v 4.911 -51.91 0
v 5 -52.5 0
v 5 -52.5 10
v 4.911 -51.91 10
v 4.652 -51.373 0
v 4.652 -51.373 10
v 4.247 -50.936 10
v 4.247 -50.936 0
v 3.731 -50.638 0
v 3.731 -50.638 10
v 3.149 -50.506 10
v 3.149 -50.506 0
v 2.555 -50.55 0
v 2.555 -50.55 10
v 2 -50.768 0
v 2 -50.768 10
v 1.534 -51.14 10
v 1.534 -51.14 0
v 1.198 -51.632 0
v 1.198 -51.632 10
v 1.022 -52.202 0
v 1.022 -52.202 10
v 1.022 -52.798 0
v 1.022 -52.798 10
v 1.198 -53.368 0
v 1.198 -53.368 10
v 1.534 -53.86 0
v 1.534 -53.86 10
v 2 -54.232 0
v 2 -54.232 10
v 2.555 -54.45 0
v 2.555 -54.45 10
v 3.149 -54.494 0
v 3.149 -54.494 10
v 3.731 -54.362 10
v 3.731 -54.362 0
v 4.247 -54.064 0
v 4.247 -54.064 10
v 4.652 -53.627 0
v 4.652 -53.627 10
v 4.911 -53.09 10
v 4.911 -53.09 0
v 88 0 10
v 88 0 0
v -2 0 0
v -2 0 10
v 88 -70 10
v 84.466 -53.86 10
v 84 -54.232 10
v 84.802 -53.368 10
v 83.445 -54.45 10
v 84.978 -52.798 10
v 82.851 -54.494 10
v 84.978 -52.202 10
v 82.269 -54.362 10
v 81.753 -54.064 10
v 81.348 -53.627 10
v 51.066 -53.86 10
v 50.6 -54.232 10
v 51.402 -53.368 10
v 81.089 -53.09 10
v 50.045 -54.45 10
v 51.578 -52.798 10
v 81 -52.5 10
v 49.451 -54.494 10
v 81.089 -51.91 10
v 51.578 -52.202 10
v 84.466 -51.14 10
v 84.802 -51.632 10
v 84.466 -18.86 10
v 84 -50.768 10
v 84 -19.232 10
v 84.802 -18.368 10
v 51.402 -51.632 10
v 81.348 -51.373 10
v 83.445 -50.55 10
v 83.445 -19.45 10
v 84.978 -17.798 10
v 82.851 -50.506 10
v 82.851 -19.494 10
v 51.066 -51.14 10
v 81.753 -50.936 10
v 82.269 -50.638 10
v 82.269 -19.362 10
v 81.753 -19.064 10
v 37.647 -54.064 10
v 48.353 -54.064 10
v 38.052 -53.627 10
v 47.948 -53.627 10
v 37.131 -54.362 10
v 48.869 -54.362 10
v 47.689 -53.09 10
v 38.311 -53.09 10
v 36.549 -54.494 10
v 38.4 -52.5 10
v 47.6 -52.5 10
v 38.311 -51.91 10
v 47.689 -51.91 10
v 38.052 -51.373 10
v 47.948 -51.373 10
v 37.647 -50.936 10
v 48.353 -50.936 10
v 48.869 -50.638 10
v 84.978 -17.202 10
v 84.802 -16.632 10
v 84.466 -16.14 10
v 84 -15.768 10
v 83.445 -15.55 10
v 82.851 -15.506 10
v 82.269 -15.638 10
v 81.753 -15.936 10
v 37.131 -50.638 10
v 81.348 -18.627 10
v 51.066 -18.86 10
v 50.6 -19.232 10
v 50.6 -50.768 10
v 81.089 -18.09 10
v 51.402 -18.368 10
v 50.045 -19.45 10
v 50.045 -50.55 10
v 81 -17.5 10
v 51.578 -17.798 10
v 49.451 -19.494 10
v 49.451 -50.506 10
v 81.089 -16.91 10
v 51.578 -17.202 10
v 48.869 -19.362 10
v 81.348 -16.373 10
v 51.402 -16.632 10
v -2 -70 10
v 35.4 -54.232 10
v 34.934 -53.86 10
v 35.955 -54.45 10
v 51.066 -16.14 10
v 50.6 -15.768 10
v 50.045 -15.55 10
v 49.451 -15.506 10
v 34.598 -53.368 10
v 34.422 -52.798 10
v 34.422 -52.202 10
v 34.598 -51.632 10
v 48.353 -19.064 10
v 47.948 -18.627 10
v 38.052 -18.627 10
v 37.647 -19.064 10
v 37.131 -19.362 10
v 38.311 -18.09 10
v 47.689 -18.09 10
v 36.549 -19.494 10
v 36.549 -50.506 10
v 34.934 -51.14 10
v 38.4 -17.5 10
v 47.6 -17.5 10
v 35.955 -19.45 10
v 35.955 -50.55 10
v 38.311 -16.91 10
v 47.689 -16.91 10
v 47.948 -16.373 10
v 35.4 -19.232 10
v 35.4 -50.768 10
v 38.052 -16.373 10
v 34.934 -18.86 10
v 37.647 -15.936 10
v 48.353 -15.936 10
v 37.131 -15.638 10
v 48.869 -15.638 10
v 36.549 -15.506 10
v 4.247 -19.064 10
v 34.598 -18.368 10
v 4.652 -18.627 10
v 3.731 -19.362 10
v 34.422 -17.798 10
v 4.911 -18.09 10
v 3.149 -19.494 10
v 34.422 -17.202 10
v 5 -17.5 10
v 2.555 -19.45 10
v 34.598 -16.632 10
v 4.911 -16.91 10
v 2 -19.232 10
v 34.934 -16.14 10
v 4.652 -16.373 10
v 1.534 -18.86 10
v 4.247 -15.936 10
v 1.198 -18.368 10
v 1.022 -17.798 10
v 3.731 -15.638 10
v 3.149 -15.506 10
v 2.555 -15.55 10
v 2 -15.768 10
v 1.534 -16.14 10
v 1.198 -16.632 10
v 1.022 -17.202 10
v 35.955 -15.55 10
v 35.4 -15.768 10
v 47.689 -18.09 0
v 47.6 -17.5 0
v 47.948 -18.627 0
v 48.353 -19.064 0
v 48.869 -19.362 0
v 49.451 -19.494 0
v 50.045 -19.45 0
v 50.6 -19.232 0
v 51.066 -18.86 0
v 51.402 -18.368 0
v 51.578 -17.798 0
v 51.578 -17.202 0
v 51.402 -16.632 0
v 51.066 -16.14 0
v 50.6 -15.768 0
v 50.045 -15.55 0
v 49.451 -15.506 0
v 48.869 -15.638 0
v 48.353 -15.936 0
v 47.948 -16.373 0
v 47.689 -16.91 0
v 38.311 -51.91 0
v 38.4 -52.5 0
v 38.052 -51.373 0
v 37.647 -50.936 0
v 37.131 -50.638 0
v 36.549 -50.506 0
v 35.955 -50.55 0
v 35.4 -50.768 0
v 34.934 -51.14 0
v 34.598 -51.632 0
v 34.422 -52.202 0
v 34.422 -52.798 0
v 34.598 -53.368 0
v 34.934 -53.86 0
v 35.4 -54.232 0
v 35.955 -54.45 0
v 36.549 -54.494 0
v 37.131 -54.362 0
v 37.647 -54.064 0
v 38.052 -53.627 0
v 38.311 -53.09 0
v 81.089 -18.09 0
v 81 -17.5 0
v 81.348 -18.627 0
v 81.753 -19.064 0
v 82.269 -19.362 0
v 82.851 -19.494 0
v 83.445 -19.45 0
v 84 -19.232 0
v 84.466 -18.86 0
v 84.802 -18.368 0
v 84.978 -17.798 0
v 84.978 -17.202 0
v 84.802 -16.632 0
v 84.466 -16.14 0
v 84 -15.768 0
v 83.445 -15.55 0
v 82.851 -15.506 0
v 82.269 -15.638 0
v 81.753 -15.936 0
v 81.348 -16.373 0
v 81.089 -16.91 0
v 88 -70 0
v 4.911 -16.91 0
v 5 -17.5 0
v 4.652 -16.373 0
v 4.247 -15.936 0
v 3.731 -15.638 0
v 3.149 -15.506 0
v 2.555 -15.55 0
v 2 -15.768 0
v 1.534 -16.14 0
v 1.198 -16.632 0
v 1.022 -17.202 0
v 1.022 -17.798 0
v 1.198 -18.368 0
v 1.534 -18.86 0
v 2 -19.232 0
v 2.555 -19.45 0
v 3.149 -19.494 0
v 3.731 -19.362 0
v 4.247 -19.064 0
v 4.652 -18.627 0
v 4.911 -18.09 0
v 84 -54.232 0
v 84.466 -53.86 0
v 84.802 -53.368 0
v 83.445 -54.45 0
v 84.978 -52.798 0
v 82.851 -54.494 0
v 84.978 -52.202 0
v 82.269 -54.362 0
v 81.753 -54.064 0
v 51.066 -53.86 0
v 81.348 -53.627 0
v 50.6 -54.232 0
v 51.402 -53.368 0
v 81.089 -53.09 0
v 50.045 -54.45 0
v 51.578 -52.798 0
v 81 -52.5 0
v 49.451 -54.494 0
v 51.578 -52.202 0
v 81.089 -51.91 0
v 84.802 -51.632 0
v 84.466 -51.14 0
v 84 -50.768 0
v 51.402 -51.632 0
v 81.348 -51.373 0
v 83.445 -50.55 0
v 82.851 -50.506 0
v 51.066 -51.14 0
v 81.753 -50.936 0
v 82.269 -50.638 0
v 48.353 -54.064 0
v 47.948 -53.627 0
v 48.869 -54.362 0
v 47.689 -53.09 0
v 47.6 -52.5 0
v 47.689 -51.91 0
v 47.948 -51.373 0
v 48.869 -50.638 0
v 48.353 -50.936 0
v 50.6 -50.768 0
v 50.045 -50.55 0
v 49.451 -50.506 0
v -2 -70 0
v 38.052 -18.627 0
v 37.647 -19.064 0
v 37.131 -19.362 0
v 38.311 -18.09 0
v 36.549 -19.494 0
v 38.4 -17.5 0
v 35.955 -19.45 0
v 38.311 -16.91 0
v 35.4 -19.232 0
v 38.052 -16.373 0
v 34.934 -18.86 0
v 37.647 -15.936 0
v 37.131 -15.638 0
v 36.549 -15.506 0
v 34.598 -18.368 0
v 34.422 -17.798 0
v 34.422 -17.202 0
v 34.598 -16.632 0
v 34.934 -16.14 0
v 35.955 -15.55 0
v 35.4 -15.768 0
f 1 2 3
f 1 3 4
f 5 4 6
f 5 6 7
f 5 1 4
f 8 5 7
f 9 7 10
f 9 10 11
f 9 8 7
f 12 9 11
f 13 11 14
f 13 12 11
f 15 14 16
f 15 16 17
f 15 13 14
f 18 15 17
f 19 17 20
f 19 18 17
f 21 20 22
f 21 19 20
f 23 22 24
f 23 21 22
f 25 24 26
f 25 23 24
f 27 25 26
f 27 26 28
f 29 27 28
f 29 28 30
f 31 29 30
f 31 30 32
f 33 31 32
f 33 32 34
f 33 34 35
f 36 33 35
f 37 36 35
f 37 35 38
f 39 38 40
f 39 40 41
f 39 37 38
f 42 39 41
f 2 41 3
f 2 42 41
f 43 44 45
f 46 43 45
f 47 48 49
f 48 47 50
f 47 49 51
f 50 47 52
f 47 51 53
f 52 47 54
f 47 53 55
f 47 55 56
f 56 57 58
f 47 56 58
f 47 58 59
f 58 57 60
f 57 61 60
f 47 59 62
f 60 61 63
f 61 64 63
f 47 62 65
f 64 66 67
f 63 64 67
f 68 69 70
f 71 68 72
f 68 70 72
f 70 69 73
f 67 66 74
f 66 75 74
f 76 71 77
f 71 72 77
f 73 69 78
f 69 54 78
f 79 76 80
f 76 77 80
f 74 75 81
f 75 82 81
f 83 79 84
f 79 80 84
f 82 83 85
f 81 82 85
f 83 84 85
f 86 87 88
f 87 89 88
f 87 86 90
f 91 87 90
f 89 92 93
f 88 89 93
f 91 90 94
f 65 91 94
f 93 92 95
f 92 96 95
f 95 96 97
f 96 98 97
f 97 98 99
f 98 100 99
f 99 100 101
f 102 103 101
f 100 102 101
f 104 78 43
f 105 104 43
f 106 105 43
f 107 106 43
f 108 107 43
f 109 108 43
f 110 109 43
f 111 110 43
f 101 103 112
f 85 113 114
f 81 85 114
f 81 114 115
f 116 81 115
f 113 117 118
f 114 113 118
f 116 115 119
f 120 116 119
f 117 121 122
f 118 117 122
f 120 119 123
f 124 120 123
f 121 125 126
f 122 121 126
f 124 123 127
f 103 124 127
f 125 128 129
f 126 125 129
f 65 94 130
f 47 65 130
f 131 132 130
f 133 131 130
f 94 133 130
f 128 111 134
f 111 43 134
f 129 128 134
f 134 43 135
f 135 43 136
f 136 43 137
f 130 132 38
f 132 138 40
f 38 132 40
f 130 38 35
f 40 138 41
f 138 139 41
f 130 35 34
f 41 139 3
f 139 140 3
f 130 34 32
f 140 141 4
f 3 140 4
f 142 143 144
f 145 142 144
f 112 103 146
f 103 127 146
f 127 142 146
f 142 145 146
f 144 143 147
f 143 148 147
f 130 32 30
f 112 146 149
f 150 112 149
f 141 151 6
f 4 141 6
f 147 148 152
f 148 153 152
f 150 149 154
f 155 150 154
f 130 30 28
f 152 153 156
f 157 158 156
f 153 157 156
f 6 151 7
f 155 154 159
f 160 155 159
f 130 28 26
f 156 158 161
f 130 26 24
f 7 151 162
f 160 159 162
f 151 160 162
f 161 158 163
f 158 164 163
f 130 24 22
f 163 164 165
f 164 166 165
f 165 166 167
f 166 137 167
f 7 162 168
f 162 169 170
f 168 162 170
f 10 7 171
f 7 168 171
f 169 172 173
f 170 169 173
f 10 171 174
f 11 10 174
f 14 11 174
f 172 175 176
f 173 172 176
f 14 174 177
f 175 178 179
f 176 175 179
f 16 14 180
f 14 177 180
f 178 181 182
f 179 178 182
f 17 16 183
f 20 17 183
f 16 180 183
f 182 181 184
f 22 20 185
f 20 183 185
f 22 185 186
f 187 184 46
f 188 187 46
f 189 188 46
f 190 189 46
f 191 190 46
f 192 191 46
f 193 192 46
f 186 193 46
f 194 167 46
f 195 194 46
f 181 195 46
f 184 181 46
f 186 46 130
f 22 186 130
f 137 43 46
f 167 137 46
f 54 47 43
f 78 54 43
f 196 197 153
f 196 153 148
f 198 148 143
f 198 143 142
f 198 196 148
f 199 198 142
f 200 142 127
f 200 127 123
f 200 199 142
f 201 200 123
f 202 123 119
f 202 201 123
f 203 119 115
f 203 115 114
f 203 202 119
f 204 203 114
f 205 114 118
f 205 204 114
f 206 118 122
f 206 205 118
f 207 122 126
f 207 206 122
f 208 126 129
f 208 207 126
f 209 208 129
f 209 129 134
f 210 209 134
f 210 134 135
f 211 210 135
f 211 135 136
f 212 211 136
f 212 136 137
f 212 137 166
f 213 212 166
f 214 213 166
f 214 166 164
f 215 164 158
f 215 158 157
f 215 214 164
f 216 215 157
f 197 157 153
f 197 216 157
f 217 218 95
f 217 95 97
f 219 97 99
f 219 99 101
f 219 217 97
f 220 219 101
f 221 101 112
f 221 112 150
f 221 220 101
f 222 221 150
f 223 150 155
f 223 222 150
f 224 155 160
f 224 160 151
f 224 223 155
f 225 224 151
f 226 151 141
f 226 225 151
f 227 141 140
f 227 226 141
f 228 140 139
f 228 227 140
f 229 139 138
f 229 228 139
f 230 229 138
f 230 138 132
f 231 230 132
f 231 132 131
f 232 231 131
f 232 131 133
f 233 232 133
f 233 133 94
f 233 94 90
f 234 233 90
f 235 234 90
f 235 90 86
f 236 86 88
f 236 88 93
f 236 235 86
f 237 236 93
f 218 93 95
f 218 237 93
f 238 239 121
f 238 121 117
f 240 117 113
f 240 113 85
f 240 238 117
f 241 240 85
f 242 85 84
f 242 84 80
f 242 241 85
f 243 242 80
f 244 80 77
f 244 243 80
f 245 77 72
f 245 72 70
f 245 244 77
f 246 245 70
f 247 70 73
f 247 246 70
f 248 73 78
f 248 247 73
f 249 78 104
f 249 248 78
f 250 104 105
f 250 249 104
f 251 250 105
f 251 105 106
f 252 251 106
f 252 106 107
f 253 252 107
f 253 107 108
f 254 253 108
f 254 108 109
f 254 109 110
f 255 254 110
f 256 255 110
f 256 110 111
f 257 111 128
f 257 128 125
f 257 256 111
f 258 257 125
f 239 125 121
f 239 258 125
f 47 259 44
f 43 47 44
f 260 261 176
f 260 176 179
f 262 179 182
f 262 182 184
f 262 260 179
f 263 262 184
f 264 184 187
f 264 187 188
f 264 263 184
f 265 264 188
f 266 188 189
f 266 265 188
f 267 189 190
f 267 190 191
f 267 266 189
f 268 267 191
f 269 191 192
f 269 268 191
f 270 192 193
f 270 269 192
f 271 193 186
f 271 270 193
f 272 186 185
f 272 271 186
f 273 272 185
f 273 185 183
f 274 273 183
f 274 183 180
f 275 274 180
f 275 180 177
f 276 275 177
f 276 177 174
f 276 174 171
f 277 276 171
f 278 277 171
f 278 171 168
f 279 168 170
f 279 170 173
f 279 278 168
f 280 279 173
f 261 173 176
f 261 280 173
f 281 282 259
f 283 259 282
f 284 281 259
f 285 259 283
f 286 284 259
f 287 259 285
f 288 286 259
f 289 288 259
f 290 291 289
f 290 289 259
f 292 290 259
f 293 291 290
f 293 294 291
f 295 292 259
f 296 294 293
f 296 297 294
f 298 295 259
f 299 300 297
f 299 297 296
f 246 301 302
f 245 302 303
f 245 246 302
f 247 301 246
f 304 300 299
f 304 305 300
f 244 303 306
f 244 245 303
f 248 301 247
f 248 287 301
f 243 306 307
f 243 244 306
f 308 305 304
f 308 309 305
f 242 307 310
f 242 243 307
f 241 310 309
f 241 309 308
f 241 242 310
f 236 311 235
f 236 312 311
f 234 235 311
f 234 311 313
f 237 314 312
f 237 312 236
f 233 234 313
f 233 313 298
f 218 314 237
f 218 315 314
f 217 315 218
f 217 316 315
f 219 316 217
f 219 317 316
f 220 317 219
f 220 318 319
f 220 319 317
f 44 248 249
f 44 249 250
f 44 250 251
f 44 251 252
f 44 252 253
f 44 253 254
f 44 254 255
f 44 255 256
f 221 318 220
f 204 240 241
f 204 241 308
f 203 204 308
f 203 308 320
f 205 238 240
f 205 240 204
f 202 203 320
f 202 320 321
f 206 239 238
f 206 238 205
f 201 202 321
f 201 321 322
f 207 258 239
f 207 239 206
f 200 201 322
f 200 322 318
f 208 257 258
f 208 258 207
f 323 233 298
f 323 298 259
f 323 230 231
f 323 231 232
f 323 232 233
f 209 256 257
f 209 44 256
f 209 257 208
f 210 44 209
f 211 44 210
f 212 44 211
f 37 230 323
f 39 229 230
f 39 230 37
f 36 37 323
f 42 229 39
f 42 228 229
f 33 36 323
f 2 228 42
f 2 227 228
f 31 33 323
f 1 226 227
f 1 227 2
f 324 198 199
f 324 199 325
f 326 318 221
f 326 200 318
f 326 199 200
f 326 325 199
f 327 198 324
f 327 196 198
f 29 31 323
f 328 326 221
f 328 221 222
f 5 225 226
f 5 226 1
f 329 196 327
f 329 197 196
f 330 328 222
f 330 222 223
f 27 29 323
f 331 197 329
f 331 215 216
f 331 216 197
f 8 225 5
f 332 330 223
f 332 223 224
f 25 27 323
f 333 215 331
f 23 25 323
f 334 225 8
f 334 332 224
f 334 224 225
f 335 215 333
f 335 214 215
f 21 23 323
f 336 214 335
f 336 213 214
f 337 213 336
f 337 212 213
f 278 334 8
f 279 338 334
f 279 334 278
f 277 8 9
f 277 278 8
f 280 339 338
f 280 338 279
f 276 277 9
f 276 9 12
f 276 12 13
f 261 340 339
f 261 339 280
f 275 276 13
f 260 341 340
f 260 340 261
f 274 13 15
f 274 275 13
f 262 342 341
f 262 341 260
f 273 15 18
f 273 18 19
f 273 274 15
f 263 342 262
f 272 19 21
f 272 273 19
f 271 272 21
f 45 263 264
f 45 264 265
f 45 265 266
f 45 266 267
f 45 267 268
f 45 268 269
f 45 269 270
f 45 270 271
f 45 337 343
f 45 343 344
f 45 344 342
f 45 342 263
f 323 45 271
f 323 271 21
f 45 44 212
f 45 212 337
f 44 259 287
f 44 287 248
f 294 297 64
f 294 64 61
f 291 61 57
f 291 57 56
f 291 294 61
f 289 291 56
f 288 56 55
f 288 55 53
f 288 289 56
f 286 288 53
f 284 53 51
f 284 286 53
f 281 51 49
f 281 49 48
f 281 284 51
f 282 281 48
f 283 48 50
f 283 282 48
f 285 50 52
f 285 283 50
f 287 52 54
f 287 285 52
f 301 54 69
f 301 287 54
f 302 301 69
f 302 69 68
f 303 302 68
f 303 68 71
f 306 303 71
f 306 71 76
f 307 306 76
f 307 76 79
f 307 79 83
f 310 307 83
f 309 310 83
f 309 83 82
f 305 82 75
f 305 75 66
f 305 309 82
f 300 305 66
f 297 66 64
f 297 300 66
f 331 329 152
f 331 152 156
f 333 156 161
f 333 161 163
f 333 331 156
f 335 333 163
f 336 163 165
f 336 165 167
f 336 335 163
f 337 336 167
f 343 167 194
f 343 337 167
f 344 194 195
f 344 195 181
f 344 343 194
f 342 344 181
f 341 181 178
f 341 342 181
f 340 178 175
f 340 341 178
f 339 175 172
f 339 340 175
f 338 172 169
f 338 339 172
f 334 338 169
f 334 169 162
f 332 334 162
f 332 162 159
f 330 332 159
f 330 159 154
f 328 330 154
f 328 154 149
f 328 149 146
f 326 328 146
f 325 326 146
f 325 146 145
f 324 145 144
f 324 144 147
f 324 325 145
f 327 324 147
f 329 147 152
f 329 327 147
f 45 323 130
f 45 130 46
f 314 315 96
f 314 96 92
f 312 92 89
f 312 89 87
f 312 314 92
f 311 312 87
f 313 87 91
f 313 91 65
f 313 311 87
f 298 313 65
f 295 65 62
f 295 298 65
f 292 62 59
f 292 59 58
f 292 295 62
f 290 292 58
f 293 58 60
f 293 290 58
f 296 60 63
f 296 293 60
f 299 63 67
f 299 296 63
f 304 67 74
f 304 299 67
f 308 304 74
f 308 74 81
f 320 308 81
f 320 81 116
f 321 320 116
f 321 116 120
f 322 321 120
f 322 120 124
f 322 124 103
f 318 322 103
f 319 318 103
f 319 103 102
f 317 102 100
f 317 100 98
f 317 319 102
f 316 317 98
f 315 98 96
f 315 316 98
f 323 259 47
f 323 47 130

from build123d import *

# Parameters (mm, degrees)
ESQUISSE1_W         = 86
ESQUISSE1_H         = 70
ESQUISSE1_R         = 2
BOSS_EXTRU_1_DEPTH  = 10
SKETCH1_W           = 2
SKETCH1_H           = 70
BOSS_EXTRUDE2_DEPTH = 10


with BuildPart() as part:
    # Esquisse1 → Boss.-Extru.1 (new body)
    with BuildSketch(Plane.XY):
        with Locations((43, -35)):
            Rectangle(ESQUISSE1_W, ESQUISSE1_H)
        with Locations((3, -17.5)):
            Circle(ESQUISSE1_R, mode=Mode.SUBTRACT)
        with Locations((3, -52.5)):
            Circle(ESQUISSE1_R, mode=Mode.SUBTRACT)
        with Locations((36.4, -52.5)):
            Circle(ESQUISSE1_R, mode=Mode.SUBTRACT)
        with Locations((36.4, -17.5)):
            Circle(ESQUISSE1_R, mode=Mode.SUBTRACT)
        with Locations(Location((49.6, -52.5, 0), (0, 0, 180))):
            Circle(ESQUISSE1_R, mode=Mode.SUBTRACT)
        with Locations(Location((83, -52.5, 0), (0, 0, 180))):
            Circle(ESQUISSE1_R, mode=Mode.SUBTRACT)
        with Locations(Location((83, -17.5, 0), (0, 0, 180))):
            Circle(ESQUISSE1_R, mode=Mode.SUBTRACT)
        with Locations(Location((49.6, -17.5, 0), (0, 0, 180))):
            Circle(ESQUISSE1_R, mode=Mode.SUBTRACT)
    extrude(amount=BOSS_EXTRU_1_DEPTH)

    # Sketch1 → Boss-Extrude2 (add)
    with BuildSketch(Plane(origin=(0, 0, 0), x_dir=(-1, 0, 0), z_dir=(0, 0, -1))):
        with Locations((1, -35)):
            Rectangle(SKETCH1_W, SKETCH1_H)
        with Locations((-87, -35)):
            Rectangle(SKETCH1_W, SKETCH1_H)
    extrude(amount=-BOSS_EXTRUDE2_DEPTH)


solid = part.part
